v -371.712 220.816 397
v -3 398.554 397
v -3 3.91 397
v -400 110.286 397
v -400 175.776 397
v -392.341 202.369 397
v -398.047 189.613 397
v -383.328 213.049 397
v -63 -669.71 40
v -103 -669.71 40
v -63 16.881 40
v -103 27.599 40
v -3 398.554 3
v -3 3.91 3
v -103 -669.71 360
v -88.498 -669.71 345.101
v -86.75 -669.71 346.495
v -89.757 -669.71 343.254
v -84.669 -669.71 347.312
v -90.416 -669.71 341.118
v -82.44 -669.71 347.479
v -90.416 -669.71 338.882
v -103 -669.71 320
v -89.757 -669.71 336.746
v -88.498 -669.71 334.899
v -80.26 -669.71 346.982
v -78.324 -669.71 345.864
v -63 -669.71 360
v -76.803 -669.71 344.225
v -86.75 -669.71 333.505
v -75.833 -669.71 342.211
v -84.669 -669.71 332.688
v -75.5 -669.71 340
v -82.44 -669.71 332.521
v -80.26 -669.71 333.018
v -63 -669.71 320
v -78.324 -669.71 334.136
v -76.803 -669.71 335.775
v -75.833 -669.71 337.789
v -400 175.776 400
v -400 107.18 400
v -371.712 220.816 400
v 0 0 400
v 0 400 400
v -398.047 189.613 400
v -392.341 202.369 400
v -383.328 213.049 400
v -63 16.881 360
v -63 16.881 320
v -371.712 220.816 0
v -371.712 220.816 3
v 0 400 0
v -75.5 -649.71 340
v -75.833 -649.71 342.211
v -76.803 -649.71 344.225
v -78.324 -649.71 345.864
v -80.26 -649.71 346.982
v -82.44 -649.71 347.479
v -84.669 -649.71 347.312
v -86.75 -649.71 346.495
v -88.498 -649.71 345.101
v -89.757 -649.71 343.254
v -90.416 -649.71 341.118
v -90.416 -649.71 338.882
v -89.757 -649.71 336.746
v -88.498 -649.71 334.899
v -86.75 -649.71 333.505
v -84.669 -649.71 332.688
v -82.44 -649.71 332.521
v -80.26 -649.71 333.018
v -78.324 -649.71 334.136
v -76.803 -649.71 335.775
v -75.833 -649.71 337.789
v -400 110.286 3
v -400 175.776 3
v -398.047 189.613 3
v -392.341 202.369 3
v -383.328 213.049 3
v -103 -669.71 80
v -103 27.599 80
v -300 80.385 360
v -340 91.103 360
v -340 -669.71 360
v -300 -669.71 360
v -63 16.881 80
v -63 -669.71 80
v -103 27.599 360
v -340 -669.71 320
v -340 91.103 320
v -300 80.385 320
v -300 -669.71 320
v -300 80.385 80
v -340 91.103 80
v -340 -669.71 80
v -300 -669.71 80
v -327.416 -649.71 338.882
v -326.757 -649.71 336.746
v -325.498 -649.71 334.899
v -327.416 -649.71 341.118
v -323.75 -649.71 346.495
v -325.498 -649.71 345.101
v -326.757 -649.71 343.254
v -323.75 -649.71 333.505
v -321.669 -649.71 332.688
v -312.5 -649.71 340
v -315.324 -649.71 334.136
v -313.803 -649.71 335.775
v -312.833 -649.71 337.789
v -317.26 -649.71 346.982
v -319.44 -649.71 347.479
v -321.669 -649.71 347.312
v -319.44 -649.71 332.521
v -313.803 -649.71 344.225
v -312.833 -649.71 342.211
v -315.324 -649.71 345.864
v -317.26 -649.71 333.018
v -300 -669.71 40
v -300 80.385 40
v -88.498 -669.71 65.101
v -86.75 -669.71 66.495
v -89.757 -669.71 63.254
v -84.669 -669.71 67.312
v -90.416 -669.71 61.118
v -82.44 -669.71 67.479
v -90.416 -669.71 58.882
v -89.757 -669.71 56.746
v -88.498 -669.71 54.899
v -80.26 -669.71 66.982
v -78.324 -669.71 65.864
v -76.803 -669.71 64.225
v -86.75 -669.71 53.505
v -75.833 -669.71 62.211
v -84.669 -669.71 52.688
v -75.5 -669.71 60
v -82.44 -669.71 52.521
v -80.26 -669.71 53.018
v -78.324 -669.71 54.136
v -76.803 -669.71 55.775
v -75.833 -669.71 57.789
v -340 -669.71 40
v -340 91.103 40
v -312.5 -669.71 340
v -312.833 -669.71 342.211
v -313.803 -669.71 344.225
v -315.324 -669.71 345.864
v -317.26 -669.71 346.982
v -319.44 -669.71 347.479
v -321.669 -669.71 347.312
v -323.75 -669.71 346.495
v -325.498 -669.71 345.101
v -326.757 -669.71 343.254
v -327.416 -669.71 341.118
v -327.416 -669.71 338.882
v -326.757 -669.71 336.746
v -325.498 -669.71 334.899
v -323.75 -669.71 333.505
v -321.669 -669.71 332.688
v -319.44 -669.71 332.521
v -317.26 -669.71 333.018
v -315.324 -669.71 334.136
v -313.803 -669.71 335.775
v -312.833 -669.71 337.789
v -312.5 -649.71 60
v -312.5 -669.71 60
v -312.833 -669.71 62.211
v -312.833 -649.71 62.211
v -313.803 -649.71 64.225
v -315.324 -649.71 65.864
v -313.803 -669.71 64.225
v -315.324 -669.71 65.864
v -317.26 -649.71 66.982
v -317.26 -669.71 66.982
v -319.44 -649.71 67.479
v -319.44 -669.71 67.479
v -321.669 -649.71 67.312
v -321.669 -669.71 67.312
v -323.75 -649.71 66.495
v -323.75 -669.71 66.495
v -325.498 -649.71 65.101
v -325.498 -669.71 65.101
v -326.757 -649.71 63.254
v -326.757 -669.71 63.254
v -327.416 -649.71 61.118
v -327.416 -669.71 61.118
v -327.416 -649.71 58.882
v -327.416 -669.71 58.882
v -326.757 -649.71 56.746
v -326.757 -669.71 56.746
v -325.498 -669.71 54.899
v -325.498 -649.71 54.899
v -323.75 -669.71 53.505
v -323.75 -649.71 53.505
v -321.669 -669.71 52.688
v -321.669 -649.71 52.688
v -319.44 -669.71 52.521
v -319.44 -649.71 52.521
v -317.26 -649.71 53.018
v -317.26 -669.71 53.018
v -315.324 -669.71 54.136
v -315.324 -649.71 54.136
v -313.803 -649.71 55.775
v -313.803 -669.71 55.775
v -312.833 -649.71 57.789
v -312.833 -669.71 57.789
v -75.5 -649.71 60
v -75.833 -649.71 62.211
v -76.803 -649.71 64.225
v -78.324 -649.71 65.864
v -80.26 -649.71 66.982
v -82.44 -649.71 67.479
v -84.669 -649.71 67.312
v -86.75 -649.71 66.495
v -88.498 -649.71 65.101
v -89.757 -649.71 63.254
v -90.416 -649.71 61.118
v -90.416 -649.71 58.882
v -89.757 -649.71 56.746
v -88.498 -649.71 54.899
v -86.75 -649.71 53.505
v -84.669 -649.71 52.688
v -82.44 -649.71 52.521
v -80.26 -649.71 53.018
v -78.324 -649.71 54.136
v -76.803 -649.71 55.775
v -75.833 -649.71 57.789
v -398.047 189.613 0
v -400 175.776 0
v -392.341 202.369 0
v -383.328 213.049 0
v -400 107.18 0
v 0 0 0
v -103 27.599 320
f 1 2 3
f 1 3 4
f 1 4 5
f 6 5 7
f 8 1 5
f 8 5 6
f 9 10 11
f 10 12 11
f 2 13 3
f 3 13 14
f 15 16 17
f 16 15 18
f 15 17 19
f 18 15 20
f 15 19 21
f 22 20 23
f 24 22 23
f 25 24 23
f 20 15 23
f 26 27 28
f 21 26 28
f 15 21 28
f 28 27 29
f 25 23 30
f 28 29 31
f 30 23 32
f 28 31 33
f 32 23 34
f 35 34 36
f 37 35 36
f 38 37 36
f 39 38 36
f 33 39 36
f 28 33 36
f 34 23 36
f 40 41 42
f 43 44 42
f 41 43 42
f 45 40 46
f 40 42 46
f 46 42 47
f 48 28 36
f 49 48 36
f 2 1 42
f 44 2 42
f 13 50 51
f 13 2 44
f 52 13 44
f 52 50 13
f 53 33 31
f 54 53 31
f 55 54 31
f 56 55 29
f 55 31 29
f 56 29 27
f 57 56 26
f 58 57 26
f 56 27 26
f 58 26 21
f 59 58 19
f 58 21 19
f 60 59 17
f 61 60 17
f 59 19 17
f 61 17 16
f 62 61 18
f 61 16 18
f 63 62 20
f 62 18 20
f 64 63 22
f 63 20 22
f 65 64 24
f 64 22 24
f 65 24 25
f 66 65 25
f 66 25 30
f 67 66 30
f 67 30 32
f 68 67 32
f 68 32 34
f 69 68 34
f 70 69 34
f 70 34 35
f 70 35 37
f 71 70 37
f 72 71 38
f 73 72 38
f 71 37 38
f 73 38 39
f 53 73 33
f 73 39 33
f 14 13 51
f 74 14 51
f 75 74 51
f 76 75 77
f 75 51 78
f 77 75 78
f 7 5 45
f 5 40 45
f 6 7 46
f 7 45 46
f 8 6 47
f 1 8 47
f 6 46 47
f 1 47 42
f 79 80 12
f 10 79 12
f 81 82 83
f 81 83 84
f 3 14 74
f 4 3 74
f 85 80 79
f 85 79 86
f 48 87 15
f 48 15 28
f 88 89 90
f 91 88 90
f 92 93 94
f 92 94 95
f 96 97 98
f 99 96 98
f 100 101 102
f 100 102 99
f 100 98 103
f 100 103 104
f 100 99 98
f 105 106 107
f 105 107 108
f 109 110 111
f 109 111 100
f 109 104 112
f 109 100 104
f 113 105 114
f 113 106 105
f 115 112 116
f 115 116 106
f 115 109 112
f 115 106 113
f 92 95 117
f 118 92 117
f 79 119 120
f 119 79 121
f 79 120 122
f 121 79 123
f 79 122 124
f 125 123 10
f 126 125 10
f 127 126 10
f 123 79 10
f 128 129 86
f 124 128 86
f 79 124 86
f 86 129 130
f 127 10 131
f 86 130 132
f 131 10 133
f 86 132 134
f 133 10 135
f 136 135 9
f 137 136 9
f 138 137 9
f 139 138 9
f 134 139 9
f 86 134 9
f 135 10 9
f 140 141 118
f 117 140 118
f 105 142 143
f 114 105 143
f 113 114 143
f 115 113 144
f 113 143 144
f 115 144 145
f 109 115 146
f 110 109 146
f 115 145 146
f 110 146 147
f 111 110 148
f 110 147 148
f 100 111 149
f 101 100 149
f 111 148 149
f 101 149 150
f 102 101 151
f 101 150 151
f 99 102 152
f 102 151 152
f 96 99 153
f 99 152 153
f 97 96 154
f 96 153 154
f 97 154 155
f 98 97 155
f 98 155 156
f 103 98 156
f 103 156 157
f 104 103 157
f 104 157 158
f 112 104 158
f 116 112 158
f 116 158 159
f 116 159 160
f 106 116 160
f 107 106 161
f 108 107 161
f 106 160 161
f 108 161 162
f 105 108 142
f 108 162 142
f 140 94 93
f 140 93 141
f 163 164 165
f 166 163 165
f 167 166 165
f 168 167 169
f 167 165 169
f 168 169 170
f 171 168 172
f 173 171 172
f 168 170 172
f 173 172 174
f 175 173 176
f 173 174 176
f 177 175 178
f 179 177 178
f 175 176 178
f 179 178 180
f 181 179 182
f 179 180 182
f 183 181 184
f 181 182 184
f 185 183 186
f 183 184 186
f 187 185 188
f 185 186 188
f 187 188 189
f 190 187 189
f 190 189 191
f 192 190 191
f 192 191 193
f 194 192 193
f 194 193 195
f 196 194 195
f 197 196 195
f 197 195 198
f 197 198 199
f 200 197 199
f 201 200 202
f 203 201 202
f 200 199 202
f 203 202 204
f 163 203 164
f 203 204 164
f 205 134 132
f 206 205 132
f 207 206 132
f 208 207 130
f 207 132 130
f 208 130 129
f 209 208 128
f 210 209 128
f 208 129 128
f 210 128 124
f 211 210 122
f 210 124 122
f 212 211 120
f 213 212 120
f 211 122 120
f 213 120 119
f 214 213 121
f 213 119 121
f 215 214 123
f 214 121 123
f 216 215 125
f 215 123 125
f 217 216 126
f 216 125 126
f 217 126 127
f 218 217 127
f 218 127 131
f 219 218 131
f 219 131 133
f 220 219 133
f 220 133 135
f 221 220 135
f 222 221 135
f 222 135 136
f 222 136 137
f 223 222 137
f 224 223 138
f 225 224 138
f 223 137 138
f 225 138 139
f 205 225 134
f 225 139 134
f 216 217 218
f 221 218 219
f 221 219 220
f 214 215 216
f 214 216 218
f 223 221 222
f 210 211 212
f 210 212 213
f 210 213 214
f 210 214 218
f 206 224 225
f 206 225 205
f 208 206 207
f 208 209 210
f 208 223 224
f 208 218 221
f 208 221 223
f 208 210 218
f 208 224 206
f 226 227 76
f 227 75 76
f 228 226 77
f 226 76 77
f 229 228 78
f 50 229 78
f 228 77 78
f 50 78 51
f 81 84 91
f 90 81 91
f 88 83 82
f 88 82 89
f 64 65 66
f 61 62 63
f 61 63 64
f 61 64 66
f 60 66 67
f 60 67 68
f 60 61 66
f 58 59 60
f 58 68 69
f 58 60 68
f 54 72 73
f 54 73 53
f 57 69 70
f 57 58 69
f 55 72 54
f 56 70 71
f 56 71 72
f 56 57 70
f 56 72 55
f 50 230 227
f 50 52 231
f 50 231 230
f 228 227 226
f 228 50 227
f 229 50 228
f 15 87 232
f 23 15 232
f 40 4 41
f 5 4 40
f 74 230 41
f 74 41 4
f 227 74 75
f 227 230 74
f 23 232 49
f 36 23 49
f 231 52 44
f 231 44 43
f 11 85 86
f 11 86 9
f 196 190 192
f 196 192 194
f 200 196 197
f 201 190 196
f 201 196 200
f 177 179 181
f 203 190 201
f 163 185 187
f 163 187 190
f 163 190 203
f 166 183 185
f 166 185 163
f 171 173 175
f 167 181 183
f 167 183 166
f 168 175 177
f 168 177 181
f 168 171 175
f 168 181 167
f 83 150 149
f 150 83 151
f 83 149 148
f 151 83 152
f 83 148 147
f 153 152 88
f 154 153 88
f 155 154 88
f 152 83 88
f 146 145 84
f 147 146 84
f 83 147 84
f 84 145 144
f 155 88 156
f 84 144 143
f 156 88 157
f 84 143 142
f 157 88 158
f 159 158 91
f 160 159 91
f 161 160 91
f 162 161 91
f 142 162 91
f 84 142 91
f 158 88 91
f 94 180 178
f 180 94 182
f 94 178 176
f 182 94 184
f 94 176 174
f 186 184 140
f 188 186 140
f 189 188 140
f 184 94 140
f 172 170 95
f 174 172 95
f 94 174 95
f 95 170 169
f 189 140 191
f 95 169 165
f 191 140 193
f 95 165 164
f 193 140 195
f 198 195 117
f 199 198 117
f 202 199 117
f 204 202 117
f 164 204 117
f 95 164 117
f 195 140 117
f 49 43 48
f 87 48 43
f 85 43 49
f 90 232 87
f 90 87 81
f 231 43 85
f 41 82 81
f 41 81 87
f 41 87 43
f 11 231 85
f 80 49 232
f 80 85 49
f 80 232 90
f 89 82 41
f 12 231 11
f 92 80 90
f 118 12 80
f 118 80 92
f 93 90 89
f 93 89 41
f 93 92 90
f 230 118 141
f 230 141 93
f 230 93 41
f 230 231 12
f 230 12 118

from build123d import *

# Parameters (mm, degrees)
BOSS_EXTRUDE2_DEPTH             = 400
SHELL3_T                        = -3
FILLET2_R                       = 50
FILLET3_R                       = 50
BOSS_EXTRUDE3_REACH             = 1052
SKETCH3_W                       = 40
SKETCH3_H                       = 40
BOSS_EXTRUDE3_DIRECTION_2_DEPTH = 19.71
SKETCH4_R                       = 7.5
CUT_EXTRUDE1_DEPTH              = 20


with BuildPart() as part:
    # Sketch2 → Boss-Extrude2 (new body)
    with BuildSketch(Plane.XY):
        Polygon((0, 400), (0, 0), (-400, 107.179676972), (-400, 207.179676972), align=None)
    extrude(amount=BOSS_EXTRUDE2_DEPTH)

    # Shell3
    shell3_openings = [part.faces().sort_by_distance(p)[0] for p in [
        (-400, 157.179676972, 200),
        (-200, 303.589838486, 200),
    ]]
    offset(amount=SHELL3_T, openings=shell3_openings, kind=Kind.INTERSECTION)

    # Fillet2
    fillet2_edges = [part.edges().sort_by_distance(p)[0] for p in [
        (-400, 207.179676972, 398.5),
    ]]
    fillet(fillet2_edges, radius=FILLET2_R)

    # Fillet3
    fillet3_edges = [part.edges().sort_by_distance(p)[0] for p in [
        (-400, 207.179676972, 1.5),
    ]]
    fillet(fillet3_edges, radius=FILLET3_R)

    # Sketch3 → Boss-Extrude3 (add, up to next)
    with BuildSketch(Plane(origin=(0, -650, 0), x_dir=(1, 0, 0), z_dir=(0, 1, 0)), mode=Mode.PRIVATE) as boss_extrude3_sk1:
        with Locations((-83, -60)):
            Rectangle(SKETCH3_W, SKETCH3_H)
    boss_extrude3_tool1 = extrude(boss_extrude3_sk1.sketch, amount=BOSS_EXTRUDE3_REACH, mode=Mode.PRIVATE) - part.part
    add(boss_extrude3_tool1.solids().sort_by_distance((-83, -650, 60))[0])
    # Sketch3 → Boss-Extrude3 (add, up to next)
    with BuildSketch(Plane(origin=(0, -650, 0), x_dir=(1, 0, 0), z_dir=(0, 1, 0)), mode=Mode.PRIVATE) as boss_extrude3_sk2:
        with Locations((-320, -60)):
            Rectangle(SKETCH3_W, SKETCH3_H)
    boss_extrude3_tool2 = extrude(boss_extrude3_sk2.sketch, amount=BOSS_EXTRUDE3_REACH, mode=Mode.PRIVATE) - part.part
    add(boss_extrude3_tool2.solids().sort_by_distance((-320, -650, 60))[0])
    # Sketch3 → Boss-Extrude3 (add, up to next)
    with BuildSketch(Plane(origin=(0, -650, 0), x_dir=(1, 0, 0), z_dir=(0, 1, 0)), mode=Mode.PRIVATE) as boss_extrude3_sk3:
        with Locations((-83, -340)):
            Rectangle(SKETCH3_W, SKETCH3_H)
    boss_extrude3_tool3 = extrude(boss_extrude3_sk3.sketch, amount=BOSS_EXTRUDE3_REACH, mode=Mode.PRIVATE) - part.part
    add(boss_extrude3_tool3.solids().sort_by_distance((-83, -650, 340))[0])
    # Sketch3 → Boss-Extrude3 (add, up to next)
    with BuildSketch(Plane(origin=(0, -650, 0), x_dir=(1, 0, 0), z_dir=(0, 1, 0)), mode=Mode.PRIVATE) as boss_extrude3_sk4:
        with Locations((-320, -340)):
            Rectangle(SKETCH3_W, SKETCH3_H)
    boss_extrude3_tool4 = extrude(boss_extrude3_sk4.sketch, amount=BOSS_EXTRUDE3_REACH, mode=Mode.PRIVATE) - part.part
    add(boss_extrude3_tool4.solids().sort_by_distance((-320, -650, 340))[0])

    # Sketch3 → Boss-Extrude3 direction 2 (add)
    with BuildSketch(Plane(origin=(0, -650, 0), x_dir=(1, 0, 0), z_dir=(0, 1, 0))):
        with Locations((-83, -60)):
            Rectangle(SKETCH3_W, SKETCH3_H)
        with Locations((-320, -60)):
            Rectangle(SKETCH3_W, SKETCH3_H)
        with Locations((-83, -340)):
            Rectangle(SKETCH3_W, SKETCH3_H)
        with Locations((-320, -340)):
            Rectangle(SKETCH3_W, SKETCH3_H)
    extrude(amount=-BOSS_EXTRUDE3_DIRECTION_2_DEPTH)

    # Sketch4 → Cut-Extrude1 (cut)
    with BuildSketch(Plane.XZ.offset(669.71)):
        with Locations((-320, 340)):
            Circle(SKETCH4_R)
        with Locations((-83, 340)):
            Circle(SKETCH4_R)
        with Locations((-320, 60)):
            Circle(SKETCH4_R)
        with Locations((-83, 60)):
            Circle(SKETCH4_R)
    extrude(amount=-CUT_EXTRUDE1_DEPTH, mode=Mode.SUBTRACT)


solid = part.part
